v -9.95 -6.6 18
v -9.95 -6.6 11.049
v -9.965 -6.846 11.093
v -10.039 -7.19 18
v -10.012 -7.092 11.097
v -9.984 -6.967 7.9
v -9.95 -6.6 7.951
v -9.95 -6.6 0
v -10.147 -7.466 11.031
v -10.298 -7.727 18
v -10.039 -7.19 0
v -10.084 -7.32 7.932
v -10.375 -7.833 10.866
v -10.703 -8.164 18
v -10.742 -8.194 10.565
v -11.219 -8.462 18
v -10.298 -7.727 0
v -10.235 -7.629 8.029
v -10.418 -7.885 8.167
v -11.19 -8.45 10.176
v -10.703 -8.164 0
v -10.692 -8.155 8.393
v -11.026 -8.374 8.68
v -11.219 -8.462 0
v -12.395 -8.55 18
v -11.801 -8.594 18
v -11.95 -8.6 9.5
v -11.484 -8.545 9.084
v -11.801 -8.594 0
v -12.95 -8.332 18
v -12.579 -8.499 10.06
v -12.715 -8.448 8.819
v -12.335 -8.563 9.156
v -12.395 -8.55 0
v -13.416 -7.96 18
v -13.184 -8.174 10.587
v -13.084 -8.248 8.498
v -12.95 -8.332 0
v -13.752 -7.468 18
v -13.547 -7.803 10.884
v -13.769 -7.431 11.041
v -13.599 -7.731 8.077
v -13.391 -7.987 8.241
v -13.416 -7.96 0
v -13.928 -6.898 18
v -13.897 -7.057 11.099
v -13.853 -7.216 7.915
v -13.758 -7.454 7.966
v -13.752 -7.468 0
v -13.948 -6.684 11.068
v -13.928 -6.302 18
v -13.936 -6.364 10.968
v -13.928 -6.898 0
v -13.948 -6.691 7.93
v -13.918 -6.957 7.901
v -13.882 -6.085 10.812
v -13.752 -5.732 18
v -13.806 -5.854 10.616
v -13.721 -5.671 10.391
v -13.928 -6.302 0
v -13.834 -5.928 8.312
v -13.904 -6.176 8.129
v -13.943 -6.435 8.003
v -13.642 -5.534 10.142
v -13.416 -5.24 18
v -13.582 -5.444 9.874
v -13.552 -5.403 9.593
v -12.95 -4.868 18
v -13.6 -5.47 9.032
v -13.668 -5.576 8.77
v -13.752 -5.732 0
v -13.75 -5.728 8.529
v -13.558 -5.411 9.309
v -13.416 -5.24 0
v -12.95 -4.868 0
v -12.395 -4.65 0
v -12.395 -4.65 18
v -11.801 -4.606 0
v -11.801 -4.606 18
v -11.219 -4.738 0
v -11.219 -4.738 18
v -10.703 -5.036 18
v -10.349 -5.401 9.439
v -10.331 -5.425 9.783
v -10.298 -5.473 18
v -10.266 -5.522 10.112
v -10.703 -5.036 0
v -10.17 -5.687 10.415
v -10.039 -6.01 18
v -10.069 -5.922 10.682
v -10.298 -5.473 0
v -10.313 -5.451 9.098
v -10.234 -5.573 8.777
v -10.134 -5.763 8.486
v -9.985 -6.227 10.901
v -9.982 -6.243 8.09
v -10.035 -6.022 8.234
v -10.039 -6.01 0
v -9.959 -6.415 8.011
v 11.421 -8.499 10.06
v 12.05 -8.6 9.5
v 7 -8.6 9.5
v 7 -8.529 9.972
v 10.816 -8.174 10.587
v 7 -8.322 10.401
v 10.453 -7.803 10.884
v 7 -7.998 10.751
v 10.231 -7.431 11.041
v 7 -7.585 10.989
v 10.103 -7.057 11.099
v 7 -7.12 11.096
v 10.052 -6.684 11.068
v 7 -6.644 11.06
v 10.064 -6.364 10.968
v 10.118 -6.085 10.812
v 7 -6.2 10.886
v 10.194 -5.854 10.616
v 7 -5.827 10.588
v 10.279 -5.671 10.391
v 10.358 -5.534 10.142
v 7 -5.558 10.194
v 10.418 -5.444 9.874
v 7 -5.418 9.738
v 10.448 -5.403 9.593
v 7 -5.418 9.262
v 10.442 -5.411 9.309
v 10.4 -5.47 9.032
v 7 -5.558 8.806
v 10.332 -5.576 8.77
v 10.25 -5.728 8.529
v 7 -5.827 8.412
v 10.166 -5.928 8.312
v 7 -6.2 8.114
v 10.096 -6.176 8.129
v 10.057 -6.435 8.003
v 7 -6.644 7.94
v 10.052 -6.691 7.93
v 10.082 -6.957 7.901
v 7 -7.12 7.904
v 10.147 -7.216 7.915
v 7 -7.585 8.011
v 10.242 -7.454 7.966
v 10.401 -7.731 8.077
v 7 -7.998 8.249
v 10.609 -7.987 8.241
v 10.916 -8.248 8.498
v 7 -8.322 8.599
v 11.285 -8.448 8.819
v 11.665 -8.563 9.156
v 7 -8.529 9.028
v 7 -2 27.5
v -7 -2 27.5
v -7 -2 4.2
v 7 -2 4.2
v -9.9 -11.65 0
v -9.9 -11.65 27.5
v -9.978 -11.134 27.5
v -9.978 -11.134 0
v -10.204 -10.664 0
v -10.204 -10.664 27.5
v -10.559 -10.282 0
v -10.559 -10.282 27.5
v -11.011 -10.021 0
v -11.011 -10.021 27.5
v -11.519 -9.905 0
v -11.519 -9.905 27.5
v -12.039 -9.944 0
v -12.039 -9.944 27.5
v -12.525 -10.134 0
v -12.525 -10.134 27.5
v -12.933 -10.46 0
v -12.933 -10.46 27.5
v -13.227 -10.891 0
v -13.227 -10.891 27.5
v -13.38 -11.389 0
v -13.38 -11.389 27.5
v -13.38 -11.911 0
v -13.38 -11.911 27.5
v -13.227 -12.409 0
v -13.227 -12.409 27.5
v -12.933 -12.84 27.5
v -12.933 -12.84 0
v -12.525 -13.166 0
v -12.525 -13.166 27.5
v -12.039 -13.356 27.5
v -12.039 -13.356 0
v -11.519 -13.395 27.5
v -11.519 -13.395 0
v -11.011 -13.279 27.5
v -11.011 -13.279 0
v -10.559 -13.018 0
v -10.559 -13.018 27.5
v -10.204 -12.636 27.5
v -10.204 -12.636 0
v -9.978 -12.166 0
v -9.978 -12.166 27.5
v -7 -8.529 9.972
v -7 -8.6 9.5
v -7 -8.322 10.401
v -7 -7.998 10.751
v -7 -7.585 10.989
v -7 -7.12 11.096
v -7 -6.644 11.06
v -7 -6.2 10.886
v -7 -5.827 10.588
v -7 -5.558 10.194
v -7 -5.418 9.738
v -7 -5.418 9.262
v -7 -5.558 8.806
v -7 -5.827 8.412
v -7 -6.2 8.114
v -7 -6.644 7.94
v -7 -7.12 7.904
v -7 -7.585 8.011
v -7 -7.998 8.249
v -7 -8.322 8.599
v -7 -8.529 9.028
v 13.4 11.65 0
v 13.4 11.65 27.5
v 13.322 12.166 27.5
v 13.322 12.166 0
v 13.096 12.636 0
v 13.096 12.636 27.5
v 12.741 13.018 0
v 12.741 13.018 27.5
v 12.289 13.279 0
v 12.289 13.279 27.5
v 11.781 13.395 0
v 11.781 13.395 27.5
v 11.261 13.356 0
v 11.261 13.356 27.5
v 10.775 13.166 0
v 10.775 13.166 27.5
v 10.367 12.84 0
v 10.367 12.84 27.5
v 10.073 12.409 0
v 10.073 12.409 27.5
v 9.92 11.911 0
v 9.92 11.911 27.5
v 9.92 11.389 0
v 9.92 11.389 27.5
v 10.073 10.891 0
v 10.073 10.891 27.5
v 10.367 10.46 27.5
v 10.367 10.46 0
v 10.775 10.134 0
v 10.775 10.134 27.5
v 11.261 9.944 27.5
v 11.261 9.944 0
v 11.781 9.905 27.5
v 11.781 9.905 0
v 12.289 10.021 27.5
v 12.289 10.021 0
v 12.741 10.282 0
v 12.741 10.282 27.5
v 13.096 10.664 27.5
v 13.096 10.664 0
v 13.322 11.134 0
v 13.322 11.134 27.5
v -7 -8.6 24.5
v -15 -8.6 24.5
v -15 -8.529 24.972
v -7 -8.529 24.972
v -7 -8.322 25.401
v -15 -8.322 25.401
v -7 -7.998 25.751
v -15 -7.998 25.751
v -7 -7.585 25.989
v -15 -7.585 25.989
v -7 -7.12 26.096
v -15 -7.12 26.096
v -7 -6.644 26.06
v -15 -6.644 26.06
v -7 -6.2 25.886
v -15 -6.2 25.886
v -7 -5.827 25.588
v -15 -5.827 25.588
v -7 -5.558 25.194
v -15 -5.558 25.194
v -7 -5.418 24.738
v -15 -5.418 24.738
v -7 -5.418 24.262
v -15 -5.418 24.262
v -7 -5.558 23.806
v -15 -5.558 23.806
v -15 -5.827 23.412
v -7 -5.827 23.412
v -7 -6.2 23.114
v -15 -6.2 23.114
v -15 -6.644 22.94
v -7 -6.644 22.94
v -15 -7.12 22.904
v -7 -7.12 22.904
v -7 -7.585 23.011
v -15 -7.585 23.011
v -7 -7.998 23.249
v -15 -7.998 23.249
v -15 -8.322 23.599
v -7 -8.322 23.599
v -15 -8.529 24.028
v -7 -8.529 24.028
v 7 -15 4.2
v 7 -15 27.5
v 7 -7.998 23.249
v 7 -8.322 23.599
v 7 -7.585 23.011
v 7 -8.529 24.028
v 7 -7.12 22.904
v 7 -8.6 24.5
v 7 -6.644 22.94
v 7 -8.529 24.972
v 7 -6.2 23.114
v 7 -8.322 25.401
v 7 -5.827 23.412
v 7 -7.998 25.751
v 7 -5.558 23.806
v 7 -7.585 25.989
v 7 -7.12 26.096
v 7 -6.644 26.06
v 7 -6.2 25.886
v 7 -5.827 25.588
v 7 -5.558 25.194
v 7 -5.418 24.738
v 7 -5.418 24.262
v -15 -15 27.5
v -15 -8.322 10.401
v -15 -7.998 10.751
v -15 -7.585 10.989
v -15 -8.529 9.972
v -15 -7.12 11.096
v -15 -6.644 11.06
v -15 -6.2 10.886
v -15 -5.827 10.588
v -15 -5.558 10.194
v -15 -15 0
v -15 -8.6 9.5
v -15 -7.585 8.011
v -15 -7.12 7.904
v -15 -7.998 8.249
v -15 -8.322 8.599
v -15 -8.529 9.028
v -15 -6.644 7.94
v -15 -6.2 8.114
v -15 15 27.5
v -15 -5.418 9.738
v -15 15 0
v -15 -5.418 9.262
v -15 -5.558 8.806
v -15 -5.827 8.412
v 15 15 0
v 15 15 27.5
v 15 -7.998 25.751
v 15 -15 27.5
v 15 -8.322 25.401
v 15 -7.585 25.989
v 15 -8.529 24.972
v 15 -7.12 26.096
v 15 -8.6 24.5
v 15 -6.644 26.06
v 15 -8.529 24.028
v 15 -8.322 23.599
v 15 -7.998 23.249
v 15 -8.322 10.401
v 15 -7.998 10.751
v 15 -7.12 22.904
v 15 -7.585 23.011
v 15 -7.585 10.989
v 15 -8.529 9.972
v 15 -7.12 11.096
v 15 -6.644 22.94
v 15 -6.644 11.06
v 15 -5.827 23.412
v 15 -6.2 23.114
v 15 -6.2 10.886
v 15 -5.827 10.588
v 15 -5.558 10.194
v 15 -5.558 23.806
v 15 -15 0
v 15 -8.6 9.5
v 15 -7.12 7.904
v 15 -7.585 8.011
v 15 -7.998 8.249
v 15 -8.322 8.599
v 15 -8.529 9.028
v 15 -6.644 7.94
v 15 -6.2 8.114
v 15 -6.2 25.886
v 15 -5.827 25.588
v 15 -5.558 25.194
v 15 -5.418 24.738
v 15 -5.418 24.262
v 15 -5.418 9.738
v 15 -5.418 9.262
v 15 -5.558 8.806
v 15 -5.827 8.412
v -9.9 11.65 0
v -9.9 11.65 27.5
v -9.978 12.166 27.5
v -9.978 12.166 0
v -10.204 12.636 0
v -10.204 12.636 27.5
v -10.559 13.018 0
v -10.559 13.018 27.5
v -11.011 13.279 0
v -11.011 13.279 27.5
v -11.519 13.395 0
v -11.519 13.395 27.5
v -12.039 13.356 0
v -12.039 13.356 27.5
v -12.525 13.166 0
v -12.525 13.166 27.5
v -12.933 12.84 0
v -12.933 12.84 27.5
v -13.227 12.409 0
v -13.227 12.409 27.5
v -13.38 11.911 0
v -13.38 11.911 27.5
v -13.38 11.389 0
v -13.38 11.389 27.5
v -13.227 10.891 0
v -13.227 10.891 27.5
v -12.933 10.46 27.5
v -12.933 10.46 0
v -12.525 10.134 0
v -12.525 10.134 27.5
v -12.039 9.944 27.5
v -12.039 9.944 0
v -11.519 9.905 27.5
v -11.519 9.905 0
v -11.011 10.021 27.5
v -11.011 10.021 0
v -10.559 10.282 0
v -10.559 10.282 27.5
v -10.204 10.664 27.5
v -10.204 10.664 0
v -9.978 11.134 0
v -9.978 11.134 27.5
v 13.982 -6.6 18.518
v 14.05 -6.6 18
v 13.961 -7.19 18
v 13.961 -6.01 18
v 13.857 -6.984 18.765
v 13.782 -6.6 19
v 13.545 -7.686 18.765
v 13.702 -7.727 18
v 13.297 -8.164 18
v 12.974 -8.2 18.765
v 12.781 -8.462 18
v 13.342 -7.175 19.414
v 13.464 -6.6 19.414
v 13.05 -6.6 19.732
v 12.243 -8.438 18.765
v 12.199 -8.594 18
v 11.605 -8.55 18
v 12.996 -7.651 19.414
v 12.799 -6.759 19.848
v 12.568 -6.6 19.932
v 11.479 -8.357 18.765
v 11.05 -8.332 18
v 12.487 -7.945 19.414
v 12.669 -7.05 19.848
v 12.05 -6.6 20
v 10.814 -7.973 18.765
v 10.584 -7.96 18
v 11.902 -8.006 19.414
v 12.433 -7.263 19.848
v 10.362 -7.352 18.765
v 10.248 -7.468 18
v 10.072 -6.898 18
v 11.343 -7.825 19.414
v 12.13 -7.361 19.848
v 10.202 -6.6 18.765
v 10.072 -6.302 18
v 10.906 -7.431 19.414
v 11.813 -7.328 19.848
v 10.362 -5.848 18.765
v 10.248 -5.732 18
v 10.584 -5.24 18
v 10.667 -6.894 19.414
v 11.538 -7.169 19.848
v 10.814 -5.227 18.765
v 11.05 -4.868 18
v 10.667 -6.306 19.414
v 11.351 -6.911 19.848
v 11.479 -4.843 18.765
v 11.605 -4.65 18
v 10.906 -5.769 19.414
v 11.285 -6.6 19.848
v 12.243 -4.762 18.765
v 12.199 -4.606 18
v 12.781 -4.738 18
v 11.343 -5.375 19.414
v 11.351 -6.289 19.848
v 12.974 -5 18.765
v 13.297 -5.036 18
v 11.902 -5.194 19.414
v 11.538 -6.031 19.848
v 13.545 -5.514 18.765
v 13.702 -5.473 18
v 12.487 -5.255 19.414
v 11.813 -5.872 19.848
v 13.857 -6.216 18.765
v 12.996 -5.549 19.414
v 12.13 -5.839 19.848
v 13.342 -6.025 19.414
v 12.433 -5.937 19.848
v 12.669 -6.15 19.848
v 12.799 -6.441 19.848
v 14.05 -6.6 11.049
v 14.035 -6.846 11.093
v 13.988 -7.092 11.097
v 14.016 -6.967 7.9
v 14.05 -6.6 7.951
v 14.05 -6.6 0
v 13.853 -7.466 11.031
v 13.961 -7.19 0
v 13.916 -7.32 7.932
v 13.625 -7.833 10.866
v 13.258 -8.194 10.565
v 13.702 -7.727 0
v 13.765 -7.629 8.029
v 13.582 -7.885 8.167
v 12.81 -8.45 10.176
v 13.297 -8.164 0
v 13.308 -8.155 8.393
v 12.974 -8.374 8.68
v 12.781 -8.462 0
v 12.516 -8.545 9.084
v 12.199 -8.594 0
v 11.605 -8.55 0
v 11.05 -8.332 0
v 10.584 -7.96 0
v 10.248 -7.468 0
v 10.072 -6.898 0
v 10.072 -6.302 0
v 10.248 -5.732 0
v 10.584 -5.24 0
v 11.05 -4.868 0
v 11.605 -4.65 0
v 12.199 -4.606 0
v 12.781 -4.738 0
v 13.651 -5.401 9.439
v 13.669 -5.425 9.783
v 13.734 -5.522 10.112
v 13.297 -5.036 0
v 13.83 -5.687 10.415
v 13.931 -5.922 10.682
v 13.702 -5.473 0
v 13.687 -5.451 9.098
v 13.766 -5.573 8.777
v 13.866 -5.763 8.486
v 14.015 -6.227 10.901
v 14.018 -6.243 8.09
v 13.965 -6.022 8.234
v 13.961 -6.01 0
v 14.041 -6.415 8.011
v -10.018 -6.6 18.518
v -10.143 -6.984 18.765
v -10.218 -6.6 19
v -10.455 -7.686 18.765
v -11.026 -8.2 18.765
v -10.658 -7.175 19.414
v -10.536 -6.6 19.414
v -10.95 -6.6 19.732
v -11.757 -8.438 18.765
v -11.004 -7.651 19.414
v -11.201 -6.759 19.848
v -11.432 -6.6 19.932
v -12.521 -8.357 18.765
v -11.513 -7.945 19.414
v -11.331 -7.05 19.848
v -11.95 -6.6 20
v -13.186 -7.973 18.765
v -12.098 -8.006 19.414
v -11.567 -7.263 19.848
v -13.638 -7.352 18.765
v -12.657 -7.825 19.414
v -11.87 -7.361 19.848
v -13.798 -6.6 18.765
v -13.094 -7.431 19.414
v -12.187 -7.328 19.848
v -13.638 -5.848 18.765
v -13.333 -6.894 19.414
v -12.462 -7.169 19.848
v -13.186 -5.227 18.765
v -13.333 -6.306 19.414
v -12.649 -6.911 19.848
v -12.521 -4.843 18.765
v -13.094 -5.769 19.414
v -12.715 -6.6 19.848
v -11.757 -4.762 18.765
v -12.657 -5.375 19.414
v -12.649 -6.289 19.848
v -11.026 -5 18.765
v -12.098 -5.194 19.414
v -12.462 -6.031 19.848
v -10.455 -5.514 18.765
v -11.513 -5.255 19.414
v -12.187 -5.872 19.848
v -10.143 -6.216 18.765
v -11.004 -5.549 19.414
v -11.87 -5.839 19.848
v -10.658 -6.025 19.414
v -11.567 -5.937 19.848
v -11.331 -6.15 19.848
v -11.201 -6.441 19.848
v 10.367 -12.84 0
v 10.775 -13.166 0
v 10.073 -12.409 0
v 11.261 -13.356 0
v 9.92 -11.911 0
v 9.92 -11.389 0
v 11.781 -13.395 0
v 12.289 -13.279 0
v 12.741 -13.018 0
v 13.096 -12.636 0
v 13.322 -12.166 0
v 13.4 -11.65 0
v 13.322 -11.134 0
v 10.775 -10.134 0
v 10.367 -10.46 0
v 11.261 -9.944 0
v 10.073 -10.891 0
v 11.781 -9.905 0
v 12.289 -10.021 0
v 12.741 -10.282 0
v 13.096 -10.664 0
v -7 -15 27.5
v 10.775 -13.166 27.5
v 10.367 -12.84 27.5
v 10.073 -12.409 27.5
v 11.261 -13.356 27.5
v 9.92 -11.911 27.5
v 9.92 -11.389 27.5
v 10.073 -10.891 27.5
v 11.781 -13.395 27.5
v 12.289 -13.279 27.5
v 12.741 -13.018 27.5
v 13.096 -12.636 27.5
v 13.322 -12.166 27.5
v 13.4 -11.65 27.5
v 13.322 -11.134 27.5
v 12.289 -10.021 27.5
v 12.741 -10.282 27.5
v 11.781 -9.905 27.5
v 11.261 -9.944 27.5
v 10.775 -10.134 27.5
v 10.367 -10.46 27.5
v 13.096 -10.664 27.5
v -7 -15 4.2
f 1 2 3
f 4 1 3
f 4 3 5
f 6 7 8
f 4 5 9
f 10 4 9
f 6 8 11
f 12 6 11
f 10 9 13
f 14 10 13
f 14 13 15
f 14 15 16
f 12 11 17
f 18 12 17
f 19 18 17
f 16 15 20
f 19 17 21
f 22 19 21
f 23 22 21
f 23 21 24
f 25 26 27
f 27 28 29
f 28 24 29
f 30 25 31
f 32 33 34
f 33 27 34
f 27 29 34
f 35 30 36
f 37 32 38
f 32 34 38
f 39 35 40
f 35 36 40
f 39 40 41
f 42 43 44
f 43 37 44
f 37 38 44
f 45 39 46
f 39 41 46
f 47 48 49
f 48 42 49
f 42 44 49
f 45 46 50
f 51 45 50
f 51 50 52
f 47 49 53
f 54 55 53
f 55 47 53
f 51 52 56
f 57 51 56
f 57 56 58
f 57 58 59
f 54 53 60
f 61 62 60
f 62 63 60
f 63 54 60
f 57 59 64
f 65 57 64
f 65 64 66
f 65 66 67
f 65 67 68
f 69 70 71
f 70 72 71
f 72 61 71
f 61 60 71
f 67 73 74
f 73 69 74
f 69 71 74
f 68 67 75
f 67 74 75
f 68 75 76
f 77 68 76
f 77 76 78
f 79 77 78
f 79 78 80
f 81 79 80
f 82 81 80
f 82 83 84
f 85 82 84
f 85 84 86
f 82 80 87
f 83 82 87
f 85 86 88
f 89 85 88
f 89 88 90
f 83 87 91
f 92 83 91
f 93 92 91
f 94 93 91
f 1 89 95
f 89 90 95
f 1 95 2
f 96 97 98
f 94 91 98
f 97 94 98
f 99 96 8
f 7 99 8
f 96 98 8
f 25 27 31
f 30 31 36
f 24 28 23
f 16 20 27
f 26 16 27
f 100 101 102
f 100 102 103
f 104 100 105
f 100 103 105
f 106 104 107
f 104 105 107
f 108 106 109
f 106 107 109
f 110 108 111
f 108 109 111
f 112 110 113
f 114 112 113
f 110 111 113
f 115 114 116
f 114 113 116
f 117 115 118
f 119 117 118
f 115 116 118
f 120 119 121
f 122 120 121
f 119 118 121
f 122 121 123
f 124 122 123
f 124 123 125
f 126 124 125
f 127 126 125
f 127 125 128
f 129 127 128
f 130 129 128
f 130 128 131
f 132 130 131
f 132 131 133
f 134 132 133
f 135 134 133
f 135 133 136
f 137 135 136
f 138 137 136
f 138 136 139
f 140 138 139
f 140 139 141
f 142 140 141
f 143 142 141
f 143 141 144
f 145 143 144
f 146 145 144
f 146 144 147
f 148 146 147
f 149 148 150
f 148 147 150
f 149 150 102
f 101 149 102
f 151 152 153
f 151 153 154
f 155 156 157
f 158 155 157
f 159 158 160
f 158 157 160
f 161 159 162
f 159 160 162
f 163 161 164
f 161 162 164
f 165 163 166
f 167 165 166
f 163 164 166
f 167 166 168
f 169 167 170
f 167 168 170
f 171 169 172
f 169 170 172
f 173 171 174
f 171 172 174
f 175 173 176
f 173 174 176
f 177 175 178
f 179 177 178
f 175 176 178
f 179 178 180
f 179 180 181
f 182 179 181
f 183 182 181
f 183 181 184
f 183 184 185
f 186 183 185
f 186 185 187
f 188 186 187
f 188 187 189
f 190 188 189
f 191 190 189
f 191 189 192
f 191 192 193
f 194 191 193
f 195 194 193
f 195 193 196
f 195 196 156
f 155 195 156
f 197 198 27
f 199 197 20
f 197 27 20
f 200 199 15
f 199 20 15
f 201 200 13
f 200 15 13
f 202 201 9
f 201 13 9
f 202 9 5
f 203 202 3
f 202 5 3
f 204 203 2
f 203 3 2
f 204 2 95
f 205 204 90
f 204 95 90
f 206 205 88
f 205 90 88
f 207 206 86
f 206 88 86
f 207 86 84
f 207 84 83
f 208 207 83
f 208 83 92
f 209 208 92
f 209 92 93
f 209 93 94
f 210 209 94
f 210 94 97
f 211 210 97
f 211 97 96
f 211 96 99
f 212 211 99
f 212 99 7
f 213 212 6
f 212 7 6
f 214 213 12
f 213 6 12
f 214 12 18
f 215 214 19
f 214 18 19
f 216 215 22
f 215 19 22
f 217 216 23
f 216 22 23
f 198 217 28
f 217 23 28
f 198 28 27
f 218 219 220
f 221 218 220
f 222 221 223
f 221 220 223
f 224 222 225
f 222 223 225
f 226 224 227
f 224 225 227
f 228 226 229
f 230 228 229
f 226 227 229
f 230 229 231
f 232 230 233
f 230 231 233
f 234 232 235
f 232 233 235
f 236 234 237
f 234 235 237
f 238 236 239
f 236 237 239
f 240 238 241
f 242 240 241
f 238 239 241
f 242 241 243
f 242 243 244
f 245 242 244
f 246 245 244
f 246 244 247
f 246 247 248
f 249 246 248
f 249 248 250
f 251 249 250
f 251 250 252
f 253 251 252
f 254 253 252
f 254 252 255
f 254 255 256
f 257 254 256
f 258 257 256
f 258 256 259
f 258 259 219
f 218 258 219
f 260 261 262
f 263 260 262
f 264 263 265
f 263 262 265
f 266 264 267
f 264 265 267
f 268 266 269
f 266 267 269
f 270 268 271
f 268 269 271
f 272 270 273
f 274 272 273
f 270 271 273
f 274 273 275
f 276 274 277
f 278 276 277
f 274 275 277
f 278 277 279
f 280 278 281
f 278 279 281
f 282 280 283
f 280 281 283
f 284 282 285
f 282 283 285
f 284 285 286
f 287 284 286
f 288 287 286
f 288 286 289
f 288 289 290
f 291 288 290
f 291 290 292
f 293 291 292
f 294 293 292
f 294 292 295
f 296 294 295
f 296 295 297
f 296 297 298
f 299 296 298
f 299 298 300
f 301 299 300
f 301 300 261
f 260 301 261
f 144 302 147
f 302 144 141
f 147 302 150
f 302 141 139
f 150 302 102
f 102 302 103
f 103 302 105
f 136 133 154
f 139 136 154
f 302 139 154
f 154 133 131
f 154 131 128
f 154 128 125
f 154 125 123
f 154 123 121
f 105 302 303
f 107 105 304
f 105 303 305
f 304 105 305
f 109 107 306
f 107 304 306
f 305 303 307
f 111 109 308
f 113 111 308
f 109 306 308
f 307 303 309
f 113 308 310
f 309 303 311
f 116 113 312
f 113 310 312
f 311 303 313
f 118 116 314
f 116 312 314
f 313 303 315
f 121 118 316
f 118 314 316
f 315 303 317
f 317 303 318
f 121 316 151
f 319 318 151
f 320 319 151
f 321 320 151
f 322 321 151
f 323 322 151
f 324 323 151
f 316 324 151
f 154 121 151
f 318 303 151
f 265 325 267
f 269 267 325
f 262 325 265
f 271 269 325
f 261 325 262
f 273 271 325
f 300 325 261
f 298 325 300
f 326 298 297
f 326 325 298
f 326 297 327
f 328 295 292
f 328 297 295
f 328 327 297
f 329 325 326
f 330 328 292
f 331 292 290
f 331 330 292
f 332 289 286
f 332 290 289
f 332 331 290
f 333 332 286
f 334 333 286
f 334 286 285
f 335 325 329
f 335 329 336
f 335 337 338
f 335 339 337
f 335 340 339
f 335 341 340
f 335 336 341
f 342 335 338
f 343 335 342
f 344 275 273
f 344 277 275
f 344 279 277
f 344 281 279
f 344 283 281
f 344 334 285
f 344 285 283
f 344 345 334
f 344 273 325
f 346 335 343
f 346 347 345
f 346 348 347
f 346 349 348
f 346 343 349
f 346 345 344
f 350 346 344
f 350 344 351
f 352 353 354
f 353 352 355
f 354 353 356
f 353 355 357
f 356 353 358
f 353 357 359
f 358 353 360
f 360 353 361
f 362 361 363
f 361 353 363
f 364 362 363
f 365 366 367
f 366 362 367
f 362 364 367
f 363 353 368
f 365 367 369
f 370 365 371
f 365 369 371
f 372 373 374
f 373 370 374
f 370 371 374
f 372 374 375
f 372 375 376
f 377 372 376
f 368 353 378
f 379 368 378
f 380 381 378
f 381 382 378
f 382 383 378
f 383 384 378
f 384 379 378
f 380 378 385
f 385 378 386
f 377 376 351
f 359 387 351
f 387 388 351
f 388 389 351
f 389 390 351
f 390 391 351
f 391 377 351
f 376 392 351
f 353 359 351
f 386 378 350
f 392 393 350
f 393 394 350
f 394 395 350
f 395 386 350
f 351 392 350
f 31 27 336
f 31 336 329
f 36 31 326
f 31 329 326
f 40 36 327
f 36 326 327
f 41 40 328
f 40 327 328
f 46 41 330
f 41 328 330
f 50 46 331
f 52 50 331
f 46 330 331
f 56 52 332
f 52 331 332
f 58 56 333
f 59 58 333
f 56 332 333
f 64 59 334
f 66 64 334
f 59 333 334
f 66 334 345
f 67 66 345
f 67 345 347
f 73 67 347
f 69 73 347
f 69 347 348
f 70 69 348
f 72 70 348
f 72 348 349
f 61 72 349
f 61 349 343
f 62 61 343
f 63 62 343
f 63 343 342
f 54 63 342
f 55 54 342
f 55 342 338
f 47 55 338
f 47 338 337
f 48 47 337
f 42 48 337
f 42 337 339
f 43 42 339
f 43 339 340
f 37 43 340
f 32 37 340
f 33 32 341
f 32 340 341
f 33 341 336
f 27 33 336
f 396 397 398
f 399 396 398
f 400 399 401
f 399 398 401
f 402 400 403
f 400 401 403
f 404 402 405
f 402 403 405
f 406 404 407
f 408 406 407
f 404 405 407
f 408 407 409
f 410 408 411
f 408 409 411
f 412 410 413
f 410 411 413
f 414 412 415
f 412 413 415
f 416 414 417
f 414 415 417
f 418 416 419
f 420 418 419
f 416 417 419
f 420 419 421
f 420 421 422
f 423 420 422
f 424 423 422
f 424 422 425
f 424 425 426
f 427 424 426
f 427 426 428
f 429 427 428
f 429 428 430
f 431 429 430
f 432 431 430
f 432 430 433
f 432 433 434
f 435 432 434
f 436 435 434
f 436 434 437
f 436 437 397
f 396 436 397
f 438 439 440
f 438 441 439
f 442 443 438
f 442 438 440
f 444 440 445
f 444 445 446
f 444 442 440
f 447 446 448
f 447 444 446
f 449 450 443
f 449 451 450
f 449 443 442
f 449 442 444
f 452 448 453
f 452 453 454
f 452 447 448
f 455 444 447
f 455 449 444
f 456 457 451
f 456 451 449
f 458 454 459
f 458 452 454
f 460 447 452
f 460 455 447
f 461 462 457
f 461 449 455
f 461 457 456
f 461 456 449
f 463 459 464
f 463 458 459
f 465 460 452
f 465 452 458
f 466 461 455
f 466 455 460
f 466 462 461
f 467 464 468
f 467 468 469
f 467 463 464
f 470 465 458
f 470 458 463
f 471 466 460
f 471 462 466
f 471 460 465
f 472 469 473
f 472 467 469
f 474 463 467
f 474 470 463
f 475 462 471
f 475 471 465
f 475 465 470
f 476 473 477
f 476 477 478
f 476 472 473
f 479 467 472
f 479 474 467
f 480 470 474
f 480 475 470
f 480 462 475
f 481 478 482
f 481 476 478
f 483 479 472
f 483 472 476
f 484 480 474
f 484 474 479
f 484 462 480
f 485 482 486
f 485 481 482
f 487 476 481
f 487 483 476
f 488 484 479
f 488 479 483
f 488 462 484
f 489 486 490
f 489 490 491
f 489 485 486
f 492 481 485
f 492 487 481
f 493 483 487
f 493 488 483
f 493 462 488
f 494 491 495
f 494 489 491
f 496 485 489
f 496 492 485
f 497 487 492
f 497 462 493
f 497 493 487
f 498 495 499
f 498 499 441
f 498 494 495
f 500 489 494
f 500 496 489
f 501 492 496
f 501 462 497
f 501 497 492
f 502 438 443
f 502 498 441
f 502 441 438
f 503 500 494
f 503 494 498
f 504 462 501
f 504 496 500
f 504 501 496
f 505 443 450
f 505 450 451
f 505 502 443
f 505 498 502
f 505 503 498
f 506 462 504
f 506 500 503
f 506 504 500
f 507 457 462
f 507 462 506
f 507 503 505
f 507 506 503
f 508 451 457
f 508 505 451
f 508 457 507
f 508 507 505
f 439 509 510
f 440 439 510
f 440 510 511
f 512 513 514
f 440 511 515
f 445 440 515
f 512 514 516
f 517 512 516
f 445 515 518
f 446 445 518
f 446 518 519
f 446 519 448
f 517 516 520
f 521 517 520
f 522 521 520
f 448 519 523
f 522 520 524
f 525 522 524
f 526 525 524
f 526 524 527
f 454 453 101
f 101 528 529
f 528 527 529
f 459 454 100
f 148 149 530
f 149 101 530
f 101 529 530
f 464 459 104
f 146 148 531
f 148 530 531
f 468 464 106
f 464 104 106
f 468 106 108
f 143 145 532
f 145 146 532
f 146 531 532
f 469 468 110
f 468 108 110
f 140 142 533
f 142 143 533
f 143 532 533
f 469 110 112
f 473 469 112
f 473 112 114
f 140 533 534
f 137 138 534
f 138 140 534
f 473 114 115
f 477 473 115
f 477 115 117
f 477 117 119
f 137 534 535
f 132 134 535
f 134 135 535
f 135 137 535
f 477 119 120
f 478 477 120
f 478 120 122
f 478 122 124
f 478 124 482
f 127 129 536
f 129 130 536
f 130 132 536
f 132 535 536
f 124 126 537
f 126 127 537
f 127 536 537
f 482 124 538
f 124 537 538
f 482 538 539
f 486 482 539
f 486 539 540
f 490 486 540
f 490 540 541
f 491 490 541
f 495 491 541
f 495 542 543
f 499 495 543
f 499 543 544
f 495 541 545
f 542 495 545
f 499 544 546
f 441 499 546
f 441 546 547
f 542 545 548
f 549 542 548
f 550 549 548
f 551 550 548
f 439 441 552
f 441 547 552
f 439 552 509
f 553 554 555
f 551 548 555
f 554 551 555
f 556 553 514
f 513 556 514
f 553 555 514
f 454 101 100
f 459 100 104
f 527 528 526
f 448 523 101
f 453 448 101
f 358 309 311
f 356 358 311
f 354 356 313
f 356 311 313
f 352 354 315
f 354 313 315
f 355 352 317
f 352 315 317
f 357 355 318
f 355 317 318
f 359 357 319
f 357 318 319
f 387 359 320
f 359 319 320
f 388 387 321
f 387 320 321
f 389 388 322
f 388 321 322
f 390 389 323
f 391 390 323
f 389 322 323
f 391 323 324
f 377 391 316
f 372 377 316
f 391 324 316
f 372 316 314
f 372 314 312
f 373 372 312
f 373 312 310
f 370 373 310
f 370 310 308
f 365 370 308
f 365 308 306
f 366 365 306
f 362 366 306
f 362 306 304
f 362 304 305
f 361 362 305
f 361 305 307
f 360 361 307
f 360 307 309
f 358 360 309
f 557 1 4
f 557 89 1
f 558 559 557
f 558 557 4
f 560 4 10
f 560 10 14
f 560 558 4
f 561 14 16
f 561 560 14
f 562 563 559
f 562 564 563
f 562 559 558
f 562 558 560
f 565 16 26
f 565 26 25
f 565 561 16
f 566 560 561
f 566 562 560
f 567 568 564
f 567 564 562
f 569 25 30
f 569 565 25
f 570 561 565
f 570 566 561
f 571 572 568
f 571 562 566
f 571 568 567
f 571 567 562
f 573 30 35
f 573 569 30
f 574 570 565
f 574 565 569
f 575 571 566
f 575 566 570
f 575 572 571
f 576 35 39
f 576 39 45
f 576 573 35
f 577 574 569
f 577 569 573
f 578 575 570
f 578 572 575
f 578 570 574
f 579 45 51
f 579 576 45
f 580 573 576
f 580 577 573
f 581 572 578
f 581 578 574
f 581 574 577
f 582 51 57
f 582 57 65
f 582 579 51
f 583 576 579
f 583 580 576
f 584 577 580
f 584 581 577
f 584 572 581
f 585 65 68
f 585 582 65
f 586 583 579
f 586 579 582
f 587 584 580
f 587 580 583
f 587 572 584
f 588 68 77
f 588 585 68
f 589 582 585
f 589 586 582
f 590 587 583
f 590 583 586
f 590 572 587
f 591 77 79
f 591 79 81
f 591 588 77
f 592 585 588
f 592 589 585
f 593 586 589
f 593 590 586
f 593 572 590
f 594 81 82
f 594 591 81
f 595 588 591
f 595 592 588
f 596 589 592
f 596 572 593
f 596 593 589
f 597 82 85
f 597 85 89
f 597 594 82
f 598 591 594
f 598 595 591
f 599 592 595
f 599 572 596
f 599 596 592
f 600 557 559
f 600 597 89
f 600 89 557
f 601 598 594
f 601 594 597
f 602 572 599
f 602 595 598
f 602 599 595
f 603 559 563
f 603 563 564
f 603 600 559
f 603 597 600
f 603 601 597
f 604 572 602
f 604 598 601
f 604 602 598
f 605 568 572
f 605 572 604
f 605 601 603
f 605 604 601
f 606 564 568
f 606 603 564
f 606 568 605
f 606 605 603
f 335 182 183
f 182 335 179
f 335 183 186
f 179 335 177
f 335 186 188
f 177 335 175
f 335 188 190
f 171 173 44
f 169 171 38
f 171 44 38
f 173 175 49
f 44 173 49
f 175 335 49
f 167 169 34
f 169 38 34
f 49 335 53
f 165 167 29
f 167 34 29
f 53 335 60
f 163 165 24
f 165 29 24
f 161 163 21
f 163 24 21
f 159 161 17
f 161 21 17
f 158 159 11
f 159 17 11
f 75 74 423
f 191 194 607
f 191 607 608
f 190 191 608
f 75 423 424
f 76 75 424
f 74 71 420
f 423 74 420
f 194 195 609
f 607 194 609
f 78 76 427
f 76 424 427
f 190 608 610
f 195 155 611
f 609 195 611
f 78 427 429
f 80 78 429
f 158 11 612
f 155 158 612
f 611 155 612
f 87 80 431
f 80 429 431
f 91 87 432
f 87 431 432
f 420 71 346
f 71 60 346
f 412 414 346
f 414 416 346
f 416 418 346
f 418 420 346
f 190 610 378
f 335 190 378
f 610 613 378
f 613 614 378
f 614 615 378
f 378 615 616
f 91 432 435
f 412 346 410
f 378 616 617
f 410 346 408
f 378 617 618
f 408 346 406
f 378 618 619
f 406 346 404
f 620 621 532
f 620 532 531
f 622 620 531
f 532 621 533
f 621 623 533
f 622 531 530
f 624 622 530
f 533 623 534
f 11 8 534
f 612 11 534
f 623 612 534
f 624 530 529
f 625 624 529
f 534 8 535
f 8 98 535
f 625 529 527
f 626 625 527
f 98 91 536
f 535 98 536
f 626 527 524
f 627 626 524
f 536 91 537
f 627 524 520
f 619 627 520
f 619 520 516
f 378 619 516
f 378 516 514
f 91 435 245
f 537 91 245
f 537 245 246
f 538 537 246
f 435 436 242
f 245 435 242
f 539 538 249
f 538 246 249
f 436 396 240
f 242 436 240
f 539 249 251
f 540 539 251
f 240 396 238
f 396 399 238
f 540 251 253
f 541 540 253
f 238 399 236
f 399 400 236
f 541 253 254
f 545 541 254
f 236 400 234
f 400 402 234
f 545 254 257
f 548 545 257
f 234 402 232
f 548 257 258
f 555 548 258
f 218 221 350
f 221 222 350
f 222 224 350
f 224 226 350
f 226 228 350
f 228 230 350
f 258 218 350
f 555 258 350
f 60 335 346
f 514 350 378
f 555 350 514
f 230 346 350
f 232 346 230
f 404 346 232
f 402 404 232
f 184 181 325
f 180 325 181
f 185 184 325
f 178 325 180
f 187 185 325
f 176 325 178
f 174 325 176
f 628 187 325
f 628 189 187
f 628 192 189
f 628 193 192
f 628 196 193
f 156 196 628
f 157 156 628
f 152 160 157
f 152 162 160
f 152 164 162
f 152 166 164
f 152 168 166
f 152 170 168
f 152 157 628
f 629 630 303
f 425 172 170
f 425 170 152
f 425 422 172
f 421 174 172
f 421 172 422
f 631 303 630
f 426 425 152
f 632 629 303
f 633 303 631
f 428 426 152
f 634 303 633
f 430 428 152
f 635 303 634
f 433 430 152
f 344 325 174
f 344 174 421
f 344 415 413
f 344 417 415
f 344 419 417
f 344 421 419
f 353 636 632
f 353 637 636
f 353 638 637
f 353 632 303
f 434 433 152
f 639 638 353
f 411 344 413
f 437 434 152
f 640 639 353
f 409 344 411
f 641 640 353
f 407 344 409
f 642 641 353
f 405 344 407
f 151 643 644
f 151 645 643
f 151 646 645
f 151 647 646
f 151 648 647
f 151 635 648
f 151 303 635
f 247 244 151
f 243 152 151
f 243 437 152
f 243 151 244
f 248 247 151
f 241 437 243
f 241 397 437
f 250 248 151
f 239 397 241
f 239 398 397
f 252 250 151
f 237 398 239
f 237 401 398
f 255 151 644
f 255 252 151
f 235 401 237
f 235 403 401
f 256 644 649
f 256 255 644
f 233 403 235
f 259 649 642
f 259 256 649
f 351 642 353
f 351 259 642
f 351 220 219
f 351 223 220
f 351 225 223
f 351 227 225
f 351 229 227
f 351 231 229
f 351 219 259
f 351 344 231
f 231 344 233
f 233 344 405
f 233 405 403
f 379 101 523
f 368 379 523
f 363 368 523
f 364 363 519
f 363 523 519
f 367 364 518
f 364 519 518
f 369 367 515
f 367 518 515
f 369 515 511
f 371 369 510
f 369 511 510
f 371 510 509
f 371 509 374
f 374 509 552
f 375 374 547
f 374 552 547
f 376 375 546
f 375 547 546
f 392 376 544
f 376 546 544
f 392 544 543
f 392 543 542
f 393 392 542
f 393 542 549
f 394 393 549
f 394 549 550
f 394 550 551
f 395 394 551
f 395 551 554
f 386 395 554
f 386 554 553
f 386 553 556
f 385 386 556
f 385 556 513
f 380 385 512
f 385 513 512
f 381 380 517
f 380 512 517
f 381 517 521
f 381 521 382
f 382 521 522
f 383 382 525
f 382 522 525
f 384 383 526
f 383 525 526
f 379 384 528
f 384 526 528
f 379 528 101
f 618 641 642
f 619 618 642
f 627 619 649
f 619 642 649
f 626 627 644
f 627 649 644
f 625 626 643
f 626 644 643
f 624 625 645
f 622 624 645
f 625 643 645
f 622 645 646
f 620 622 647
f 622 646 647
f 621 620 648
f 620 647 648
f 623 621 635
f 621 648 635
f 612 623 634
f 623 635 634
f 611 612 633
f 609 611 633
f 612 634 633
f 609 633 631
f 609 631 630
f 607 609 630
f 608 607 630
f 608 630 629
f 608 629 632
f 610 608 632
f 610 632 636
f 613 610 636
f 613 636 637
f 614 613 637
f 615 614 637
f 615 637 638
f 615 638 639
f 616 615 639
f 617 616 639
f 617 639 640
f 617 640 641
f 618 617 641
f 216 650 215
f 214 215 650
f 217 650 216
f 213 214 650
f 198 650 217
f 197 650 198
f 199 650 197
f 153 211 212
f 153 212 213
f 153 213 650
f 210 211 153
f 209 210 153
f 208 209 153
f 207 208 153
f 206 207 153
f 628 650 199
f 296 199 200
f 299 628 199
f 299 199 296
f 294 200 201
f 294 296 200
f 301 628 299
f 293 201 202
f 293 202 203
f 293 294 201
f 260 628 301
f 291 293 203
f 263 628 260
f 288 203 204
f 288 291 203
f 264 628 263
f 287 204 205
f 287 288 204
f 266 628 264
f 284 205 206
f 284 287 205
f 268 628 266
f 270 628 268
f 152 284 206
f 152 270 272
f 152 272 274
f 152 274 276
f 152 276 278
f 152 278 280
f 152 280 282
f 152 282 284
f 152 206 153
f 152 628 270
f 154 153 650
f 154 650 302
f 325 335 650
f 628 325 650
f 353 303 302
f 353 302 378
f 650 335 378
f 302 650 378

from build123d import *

# Parameters (mm, degrees)
F0_W      = 30
F0_H      = 30
F1_DEPTH  = 27.5
F2_R      = 1.75
F3_DEPTH  = 27.501
F4_R      = 2
F5_DEPTH  = 20
F6_R      = 2
F7_W      = 14
F7_H      = 13
F8_DEPTH  = 23.3
F9_R      = 1.6
F10_DEPTH = 30.001


# Not quite as in the source:
# - a feature names something its author has since deleted; it is built from what else it names


with BuildPart() as f1:
    # F0 (on Top) → F1 (new body)
    with BuildSketch(Plane.XY):
        Rectangle(F0_W, F0_H)
    extrude(amount=F1_DEPTH)

    # F2 (on face) → F3 (cut, through all)
    with BuildSketch(Plane.XY.offset(27.5)):
        with Locations((-11.65, 11.65)):
            Circle(F2_R)
        with Locations((-11.65, -11.65)):
            Circle(F2_R)
        with Locations((11.65, 11.65)):
            Circle(F2_R)
        with Locations((11.65, -11.65)):
            Circle(F2_R)
    extrude(amount=-F3_DEPTH, mode=Mode.SUBTRACT)

    # F4 (on face) → F5 (cut)
    with BuildSketch(Plane(origin=(0, 0, 0), x_dir=(1, 0, 0), z_dir=(0, 0, -1))):
        with Locations((-11.95, 6.6)):
            Circle(F4_R)
        with Locations((12.05, 6.6)):
            Circle(F4_R)
    extrude(amount=-F5_DEPTH, mode=Mode.SUBTRACT)

    # F6
    f6_edges = [f1.edges().sort_by_distance(p)[0] for p in [
        (-13.95, -6.6, 20),
        (10.05, -6.6, 20),
    ]]
    fillet(f6_edges, radius=F6_R)

    # F7 (on face) → F8 (cut)
    with BuildSketch(Plane.XY.offset(27.5)):
        with Locations((0, -8.5)):
            Rectangle(F7_W, F7_H)
    extrude(amount=-F8_DEPTH, mode=Mode.SUBTRACT)

    # F9 (on face) → F10 (cut, through all)
    with BuildSketch(Plane(origin=(-15, 0, 0), x_dir=(0, -1, 0), z_dir=(-1, 0, 0))):
        with Locations((7, 9.5)):
            Circle(F9_R)
        with Locations((7, 24.5)):
            Circle(F9_R)
    extrude(amount=-F10_DEPTH, mode=Mode.SUBTRACT)


solid = f1.part
